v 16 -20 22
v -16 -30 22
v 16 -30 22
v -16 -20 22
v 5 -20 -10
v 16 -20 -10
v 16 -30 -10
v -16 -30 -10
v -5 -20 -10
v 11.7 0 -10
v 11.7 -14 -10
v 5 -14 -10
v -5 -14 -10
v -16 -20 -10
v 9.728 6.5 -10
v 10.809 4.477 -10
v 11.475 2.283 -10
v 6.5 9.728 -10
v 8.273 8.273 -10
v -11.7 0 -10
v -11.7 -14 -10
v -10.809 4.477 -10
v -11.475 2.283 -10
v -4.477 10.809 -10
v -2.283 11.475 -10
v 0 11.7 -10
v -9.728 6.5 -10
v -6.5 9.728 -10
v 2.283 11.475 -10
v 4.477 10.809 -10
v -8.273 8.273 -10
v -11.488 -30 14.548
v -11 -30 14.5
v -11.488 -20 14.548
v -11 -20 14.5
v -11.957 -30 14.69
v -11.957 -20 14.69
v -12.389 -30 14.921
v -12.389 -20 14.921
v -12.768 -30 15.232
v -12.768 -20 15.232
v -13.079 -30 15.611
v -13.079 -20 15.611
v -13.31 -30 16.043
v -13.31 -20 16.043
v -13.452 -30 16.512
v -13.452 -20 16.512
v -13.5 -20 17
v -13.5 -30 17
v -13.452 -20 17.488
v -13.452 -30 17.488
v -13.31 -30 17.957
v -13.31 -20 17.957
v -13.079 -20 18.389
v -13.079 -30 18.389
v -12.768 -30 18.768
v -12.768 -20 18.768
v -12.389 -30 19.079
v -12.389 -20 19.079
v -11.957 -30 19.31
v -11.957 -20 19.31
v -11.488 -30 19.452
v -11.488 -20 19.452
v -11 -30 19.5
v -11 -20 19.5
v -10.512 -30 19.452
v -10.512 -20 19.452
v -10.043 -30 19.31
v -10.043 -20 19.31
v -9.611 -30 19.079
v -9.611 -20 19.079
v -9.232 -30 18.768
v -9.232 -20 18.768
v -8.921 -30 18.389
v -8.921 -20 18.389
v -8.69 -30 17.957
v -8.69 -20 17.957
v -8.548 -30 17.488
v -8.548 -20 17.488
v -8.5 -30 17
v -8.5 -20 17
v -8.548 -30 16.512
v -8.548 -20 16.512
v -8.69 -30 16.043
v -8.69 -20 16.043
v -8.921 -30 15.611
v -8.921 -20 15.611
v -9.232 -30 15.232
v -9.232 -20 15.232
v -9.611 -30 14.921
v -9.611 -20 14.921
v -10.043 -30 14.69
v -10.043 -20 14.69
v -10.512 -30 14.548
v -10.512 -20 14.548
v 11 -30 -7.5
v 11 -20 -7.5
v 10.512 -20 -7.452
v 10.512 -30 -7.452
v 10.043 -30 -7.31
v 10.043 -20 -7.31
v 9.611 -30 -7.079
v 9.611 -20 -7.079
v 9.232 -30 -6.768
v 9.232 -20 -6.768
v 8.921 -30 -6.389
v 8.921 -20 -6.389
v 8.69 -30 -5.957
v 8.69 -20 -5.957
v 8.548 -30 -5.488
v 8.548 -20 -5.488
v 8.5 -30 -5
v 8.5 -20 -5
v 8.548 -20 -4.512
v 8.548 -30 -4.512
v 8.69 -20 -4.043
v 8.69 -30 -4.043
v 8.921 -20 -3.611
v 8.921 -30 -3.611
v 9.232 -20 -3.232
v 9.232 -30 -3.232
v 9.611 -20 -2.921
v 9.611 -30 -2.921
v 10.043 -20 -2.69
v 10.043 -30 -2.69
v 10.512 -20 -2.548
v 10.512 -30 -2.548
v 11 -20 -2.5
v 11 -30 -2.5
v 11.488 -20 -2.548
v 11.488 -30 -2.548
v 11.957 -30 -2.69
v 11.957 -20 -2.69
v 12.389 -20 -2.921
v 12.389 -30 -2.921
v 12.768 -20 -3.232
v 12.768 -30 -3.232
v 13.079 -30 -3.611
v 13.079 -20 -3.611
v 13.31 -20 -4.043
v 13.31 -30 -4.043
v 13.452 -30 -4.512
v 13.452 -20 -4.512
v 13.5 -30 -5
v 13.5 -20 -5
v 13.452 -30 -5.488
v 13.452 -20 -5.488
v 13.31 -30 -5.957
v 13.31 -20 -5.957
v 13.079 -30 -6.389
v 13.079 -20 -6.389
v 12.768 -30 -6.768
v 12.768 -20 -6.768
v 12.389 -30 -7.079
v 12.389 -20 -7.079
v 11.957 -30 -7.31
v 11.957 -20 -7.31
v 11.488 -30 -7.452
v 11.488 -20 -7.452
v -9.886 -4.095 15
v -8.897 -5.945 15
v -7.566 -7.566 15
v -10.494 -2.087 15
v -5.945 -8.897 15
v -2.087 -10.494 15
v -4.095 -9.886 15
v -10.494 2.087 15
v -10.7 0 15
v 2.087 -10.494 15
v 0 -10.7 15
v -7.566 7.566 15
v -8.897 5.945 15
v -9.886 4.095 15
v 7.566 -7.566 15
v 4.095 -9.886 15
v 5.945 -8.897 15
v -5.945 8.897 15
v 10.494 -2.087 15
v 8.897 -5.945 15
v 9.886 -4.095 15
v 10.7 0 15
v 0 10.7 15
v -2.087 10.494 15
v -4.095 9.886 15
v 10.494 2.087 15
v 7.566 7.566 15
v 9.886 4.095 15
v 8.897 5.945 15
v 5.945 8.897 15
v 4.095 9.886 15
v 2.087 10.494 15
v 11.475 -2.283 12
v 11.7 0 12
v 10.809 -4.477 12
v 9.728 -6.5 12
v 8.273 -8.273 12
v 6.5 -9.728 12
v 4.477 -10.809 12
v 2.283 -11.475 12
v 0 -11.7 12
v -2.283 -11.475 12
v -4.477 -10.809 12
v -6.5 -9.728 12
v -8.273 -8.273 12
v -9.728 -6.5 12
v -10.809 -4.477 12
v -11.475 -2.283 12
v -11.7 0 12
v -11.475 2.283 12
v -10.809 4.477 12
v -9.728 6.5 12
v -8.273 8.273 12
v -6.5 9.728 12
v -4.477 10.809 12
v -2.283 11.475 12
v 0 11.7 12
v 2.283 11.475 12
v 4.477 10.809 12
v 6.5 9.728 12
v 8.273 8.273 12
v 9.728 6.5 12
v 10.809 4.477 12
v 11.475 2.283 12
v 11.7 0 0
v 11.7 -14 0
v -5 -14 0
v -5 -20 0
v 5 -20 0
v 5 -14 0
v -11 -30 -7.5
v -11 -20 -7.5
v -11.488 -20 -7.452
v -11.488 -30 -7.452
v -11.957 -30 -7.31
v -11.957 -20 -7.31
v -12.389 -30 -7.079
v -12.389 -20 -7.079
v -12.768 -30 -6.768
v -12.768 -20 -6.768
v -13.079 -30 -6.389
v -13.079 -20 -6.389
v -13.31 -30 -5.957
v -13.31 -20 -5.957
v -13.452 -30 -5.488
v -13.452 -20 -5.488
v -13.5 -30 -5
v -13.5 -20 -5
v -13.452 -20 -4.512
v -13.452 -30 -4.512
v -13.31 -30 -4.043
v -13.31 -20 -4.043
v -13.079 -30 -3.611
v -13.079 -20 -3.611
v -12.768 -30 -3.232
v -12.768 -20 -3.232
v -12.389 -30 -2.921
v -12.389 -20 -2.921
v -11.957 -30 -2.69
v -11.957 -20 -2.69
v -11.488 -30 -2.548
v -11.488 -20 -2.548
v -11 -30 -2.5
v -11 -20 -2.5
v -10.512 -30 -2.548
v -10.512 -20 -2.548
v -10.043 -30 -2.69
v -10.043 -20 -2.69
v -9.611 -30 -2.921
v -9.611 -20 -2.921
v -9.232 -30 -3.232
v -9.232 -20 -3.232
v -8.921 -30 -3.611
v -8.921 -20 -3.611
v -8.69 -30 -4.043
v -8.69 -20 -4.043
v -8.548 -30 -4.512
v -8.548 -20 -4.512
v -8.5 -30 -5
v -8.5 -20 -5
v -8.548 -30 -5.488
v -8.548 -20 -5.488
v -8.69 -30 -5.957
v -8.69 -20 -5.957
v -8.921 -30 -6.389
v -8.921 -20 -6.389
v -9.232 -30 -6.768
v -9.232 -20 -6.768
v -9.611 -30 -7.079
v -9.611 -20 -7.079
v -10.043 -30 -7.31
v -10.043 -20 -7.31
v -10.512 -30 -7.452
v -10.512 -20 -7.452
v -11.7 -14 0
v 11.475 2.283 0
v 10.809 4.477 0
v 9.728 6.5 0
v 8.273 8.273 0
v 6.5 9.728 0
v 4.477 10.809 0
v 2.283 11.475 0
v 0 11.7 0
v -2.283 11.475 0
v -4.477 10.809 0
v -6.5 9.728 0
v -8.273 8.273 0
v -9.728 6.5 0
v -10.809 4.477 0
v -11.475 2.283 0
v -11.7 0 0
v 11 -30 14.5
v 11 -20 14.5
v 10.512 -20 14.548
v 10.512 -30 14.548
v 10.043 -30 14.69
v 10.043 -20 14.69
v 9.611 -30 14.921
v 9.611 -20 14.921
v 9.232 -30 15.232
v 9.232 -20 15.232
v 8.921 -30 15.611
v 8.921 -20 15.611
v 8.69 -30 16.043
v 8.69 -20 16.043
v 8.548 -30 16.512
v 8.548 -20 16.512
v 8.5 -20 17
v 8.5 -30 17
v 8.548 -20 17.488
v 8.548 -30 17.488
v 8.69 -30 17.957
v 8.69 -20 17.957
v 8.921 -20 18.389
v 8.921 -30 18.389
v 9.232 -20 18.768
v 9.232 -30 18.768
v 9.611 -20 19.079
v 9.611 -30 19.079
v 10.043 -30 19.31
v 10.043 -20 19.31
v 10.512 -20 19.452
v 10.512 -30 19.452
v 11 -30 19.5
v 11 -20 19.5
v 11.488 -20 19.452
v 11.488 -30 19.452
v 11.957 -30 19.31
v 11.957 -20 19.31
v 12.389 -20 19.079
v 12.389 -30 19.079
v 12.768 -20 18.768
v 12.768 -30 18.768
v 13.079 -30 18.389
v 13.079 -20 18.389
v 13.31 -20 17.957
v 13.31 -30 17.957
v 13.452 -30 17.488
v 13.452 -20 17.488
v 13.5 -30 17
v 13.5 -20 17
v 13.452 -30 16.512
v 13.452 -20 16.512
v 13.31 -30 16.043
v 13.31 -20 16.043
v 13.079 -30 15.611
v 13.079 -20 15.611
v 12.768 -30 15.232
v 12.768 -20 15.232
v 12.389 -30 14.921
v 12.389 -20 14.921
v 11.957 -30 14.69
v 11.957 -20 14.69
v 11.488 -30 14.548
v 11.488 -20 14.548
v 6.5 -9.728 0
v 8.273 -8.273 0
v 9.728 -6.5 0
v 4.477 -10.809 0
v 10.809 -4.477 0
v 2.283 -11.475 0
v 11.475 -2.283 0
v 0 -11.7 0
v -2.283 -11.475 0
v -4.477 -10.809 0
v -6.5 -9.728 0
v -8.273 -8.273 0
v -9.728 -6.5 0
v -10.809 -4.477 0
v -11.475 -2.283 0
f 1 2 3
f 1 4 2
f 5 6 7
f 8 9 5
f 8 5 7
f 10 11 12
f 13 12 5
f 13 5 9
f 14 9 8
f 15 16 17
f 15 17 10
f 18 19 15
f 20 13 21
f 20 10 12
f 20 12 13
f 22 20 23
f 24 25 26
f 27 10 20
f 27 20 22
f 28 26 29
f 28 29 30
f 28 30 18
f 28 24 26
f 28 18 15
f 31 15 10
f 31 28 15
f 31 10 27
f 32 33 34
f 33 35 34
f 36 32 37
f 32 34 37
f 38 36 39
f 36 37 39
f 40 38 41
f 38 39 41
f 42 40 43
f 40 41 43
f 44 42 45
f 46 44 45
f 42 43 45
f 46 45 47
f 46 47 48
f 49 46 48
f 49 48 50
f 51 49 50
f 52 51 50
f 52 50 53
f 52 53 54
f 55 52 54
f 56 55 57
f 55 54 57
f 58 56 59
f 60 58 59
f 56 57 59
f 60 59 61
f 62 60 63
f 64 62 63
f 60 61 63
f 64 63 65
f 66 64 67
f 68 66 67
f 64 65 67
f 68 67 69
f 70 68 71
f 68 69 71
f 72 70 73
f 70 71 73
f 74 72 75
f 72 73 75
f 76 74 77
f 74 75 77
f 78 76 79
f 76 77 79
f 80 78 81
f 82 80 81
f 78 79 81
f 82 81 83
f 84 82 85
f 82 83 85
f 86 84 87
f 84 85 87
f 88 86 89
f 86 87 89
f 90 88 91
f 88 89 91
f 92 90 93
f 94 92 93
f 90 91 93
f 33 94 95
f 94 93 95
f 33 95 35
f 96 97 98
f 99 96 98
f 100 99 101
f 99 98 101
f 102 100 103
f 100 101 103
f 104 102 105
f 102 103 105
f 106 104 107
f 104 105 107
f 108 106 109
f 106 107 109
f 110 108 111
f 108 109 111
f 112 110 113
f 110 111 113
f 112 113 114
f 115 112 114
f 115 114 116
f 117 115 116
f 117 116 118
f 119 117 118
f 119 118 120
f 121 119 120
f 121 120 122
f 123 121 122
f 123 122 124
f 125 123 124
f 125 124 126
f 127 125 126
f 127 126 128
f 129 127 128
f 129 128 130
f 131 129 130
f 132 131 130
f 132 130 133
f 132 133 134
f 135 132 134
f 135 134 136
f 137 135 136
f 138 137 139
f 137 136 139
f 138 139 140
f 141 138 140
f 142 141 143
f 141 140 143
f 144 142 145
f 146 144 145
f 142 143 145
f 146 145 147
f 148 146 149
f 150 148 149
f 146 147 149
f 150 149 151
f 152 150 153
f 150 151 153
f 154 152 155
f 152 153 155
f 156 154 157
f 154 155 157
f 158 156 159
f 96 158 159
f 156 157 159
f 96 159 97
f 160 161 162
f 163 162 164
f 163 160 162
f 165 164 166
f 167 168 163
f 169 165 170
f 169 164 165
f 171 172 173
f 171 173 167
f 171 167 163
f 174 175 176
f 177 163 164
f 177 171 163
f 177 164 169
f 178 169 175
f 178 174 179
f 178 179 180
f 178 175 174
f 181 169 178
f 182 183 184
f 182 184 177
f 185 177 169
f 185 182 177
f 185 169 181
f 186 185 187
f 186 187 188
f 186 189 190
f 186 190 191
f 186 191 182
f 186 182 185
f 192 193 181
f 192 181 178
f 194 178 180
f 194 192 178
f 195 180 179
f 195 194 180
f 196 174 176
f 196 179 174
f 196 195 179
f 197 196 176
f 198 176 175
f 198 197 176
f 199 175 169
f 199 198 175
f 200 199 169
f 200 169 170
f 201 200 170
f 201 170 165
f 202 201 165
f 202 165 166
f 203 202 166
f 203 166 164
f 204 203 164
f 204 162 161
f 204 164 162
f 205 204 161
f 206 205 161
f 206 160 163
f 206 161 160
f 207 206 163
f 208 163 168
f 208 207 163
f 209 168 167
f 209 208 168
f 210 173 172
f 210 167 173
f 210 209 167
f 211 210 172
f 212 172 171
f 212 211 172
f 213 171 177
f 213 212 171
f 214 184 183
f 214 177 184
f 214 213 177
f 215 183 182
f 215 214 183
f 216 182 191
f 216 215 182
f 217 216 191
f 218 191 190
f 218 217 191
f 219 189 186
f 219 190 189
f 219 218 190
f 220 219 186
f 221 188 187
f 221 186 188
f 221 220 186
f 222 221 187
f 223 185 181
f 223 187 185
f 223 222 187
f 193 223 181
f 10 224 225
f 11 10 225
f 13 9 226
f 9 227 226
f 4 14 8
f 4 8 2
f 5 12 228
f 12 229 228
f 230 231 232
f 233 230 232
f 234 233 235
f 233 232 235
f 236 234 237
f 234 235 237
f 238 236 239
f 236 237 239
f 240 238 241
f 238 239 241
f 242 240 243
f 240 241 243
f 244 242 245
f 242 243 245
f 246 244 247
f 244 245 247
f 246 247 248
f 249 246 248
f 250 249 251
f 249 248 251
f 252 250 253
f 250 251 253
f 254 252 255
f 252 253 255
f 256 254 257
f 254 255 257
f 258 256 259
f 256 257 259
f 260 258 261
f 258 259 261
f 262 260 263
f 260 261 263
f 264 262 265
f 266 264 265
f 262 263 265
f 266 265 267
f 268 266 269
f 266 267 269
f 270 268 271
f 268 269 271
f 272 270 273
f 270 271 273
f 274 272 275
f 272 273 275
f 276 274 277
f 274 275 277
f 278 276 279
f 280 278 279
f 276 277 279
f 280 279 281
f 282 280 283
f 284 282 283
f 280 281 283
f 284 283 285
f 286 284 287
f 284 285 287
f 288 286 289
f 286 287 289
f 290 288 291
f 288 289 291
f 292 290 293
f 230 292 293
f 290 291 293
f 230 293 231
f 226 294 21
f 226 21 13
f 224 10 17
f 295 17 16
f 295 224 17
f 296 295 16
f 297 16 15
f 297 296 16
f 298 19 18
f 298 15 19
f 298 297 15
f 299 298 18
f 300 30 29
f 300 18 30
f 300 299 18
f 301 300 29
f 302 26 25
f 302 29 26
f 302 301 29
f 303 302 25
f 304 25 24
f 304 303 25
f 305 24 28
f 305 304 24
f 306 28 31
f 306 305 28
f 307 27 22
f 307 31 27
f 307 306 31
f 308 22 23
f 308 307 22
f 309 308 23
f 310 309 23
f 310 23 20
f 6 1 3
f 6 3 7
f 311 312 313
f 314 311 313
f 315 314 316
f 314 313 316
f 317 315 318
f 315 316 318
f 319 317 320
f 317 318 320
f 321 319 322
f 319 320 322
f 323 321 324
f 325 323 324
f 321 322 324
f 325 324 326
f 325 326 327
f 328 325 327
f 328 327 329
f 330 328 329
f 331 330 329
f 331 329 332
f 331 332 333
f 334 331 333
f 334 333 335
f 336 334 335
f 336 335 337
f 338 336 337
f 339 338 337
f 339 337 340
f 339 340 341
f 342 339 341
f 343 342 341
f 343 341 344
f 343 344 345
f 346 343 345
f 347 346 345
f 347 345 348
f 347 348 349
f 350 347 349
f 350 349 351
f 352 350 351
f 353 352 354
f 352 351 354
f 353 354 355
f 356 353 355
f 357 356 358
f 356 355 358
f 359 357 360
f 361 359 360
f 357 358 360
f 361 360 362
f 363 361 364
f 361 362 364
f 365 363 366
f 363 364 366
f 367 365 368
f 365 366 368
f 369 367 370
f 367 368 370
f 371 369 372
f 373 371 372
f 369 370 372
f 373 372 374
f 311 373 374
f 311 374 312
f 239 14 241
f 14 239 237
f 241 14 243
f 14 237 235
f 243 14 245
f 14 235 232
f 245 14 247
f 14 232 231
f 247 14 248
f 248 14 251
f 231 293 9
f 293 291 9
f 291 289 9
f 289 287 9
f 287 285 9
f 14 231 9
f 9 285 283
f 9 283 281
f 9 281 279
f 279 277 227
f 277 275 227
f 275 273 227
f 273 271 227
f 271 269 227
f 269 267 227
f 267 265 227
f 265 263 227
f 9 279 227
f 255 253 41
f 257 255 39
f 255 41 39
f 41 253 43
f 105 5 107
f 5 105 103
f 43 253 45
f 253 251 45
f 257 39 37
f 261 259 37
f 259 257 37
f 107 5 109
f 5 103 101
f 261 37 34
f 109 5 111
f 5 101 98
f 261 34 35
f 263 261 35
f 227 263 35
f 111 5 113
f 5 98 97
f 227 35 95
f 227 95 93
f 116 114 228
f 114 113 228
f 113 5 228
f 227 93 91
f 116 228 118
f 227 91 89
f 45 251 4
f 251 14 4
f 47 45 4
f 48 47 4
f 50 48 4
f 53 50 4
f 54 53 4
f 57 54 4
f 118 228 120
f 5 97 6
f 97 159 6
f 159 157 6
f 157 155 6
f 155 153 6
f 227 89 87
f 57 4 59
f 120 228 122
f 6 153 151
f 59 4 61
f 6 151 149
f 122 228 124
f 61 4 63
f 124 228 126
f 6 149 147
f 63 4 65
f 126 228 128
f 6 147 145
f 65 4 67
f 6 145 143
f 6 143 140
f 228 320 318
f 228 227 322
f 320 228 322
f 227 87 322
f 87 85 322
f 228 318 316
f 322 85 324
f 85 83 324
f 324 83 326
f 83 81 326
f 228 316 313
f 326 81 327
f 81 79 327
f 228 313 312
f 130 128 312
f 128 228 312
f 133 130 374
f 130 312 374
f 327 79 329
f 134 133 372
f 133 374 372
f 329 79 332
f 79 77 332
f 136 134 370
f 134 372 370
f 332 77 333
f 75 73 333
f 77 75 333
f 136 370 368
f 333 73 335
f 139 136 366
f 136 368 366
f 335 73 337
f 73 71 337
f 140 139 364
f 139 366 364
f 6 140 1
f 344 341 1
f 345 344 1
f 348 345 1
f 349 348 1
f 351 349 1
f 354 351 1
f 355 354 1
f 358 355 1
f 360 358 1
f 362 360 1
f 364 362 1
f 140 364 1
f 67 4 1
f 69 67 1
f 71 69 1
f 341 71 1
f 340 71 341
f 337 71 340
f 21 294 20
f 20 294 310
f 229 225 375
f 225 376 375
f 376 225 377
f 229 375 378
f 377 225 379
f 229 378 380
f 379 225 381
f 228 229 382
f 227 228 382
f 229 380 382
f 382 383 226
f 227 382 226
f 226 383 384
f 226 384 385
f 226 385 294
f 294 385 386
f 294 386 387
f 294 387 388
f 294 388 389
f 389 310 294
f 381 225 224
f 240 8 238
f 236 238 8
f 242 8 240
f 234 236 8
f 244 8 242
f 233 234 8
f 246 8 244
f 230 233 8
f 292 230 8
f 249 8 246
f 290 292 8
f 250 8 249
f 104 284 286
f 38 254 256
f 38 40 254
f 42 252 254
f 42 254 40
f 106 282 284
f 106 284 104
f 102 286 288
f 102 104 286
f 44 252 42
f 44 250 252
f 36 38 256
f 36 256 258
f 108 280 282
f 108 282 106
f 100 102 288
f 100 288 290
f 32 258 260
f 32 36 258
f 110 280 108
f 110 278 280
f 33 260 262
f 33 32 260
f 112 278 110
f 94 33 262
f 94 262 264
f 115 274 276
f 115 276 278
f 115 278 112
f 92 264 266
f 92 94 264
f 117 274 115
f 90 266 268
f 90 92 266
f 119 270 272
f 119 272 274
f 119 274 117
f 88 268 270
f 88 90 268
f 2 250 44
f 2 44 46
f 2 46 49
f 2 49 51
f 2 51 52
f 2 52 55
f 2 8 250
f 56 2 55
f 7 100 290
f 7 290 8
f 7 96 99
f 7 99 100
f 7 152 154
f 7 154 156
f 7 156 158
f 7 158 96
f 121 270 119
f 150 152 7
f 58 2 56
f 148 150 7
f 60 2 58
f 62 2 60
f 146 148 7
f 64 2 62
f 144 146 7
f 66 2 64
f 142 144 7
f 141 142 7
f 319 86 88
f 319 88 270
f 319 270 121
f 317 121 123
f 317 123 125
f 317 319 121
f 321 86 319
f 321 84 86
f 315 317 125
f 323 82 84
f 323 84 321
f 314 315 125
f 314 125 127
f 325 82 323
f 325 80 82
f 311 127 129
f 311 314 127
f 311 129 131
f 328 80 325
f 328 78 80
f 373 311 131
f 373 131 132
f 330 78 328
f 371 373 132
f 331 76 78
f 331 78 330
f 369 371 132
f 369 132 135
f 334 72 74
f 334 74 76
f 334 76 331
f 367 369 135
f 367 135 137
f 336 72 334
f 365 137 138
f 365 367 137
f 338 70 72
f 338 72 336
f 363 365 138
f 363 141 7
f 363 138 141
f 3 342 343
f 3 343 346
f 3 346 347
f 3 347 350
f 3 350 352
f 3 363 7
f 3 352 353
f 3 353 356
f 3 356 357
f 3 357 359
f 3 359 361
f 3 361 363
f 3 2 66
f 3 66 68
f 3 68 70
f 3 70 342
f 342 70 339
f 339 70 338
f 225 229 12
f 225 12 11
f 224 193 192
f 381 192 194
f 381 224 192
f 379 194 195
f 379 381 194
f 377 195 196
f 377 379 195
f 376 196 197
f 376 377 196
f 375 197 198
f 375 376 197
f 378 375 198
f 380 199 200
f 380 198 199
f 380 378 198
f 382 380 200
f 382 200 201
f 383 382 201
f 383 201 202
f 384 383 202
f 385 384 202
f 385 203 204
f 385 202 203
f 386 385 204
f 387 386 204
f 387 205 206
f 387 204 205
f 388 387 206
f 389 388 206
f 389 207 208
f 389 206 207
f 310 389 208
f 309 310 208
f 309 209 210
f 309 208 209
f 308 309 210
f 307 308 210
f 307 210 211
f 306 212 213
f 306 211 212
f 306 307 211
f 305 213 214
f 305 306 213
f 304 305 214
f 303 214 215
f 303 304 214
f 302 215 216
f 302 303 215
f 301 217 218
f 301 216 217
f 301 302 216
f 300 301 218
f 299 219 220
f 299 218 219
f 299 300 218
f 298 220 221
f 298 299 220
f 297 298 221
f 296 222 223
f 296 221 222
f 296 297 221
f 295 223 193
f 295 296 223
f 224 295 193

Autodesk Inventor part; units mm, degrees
ref_plane "YZ Plane" through (0, 0, 0) normal (1, 0, 0) x (0, 1, 0)
ref_plane "XZ Plane" through (0, 0, 0) normal (0, 1, 0) x (-1, 0, 0)
ref_plane "XY Plane" through (0, 0, 0) normal (0, 0, 1) x (1, 0, 0)
sketch "Sketch1" plane through (0, 0, 0) normal (0, 0, 1) x (1, 0, 0)
  circle A0 centre (0, 0) radius 11.7
  dimension "d0" = 23.4
extrude "Extrusion1" add sketch "Sketch1" along normal blind 15
sketch "Sketch2" plane through (0, 0, 0) normal (0, 0, -1) x (-1, 0, 0)
  circle A0 centre (0, 0) radius 11.7 projected
  line L0 (-11.7, 0) -> (-11.7, -20)
  line L1 (-11.7, -20) -> (11.7, -20)
  line L2 (11.7, -20) -> (11.7, 0)
  circle A1 centre (0, 0) radius 11.7 projected
  line L3 (-11.7, 0) -> (11.7, 0)
  point P0 (11.7, 0)
  point P1 (-11.7, 0)
  dimension "d3" = 20
extrude "Extrusion2" add sketch "Sketch2" along normal blind 10
sketch "Sketch3" plane through (-11.7, -20, 0) normal (0, -1, 0) x (1, 0, 0)
  line L0 (-4.3, 22) -> (27.7, 22)
  line L1 (27.7, 22) -> (27.7, -10)
  line L2 (27.7, -10) -> (-4.3, -10)
  line L3 (-4.3, -10) -> (-4.3, 22)
  line L4 (23.4, -10) -> (0, -10) projected
  line L5 (23.4, 0) -> (0, 0) projected
  point P0 (11.7, 0)
  point P1 (11.7, 22)
  point P2 (11.7, 0)
  dimension "d6" = 32
  dimension "d7" = 32
extrude "Extrusion3" add sketch "Sketch3" along normal blind 10
sketch "Sketch4" plane through (-11.7, -30, 0) normal (0, -1, 0) x (1, 0, 0)
  line L0 (0.7, 17) -> (22.7, 17) construction
  line L1 (22.7, 17) -> (22.7, -5) construction
  line L2 (22.7, -5) -> (0.7, -5) construction
  line L3 (0.7, -5) -> (0.7, 17) construction
  line L4 (27.7, 22) -> (-4.3, 22) construction
  line L5 (-4.3, 22) -> (-4.3, -10) construction
  point P0 (11.7, 0)
  point P1 (11.7, 17)
  point P2 (11.7, 22)
  point P3 (0.7, 6)
  point P4 (-4.3, 6)
  dimension "d10" = 22
  dimension "d11" = 22
hole "Hole1" at (-11, -30, 17) at (11, -30, 17) at (11, -30, -5) at (-11, -30, -5) direction (0, 1, 0) diameter 5 depth 10
sketch "Sketch5" plane through (0, 0, 0) normal (0, 0, 1) x (1, 0, 0)
  line L0 (11.7, -20) -> (-11.7, -20) projected
  line L1 (5, -20) -> (-5, -20)
  line L2 (-5, -20) -> (-5, -11.7)
  line L3 (-5, -11.7) -> (5, -11.7)
  line L4 (5, -11.7) -> (5, -20)
  circle A0 centre (0, 0) radius 11.7 projected
  line L5 (11.7, -20) -> (5, -20)
  line L6 (5, -20) -> (5, -14)
  line L7 (5, -14) -> (11.7, -14)
  line L8 (11.7, -14) -> (11.7, -20)
  line L9 (-5, -20) -> (-11.7, -20)
  line L10 (-11.7, -20) -> (-11.7, -14)
  line L11 (-11.7, -14) -> (-5, -14)
  line L12 (-5, -14) -> (-5, -20)
  line L13 (-11.7, -20) -> (-11.7, 0) projected
  line L14 (11.7, 0) -> (11.7, -20) projected
  point P0 (0, -11.7)
  dimension "d19" = 10
  dimension "d20" = 6
extrude "Extrusion4" cut sketch "Sketch5" against normal through all contours L0 L4 L7 L8 | L0 L10 L11 L2
chamfer "Chamfer1" distance 1 distance2 3 1 edges at (-11.7, 0, 15) measured on face at (-1.2696, -2.7132, 15)
equation "\"d7\" = d6"
equation "\"d11\" = d10"
properties part number "0008-30-004"
